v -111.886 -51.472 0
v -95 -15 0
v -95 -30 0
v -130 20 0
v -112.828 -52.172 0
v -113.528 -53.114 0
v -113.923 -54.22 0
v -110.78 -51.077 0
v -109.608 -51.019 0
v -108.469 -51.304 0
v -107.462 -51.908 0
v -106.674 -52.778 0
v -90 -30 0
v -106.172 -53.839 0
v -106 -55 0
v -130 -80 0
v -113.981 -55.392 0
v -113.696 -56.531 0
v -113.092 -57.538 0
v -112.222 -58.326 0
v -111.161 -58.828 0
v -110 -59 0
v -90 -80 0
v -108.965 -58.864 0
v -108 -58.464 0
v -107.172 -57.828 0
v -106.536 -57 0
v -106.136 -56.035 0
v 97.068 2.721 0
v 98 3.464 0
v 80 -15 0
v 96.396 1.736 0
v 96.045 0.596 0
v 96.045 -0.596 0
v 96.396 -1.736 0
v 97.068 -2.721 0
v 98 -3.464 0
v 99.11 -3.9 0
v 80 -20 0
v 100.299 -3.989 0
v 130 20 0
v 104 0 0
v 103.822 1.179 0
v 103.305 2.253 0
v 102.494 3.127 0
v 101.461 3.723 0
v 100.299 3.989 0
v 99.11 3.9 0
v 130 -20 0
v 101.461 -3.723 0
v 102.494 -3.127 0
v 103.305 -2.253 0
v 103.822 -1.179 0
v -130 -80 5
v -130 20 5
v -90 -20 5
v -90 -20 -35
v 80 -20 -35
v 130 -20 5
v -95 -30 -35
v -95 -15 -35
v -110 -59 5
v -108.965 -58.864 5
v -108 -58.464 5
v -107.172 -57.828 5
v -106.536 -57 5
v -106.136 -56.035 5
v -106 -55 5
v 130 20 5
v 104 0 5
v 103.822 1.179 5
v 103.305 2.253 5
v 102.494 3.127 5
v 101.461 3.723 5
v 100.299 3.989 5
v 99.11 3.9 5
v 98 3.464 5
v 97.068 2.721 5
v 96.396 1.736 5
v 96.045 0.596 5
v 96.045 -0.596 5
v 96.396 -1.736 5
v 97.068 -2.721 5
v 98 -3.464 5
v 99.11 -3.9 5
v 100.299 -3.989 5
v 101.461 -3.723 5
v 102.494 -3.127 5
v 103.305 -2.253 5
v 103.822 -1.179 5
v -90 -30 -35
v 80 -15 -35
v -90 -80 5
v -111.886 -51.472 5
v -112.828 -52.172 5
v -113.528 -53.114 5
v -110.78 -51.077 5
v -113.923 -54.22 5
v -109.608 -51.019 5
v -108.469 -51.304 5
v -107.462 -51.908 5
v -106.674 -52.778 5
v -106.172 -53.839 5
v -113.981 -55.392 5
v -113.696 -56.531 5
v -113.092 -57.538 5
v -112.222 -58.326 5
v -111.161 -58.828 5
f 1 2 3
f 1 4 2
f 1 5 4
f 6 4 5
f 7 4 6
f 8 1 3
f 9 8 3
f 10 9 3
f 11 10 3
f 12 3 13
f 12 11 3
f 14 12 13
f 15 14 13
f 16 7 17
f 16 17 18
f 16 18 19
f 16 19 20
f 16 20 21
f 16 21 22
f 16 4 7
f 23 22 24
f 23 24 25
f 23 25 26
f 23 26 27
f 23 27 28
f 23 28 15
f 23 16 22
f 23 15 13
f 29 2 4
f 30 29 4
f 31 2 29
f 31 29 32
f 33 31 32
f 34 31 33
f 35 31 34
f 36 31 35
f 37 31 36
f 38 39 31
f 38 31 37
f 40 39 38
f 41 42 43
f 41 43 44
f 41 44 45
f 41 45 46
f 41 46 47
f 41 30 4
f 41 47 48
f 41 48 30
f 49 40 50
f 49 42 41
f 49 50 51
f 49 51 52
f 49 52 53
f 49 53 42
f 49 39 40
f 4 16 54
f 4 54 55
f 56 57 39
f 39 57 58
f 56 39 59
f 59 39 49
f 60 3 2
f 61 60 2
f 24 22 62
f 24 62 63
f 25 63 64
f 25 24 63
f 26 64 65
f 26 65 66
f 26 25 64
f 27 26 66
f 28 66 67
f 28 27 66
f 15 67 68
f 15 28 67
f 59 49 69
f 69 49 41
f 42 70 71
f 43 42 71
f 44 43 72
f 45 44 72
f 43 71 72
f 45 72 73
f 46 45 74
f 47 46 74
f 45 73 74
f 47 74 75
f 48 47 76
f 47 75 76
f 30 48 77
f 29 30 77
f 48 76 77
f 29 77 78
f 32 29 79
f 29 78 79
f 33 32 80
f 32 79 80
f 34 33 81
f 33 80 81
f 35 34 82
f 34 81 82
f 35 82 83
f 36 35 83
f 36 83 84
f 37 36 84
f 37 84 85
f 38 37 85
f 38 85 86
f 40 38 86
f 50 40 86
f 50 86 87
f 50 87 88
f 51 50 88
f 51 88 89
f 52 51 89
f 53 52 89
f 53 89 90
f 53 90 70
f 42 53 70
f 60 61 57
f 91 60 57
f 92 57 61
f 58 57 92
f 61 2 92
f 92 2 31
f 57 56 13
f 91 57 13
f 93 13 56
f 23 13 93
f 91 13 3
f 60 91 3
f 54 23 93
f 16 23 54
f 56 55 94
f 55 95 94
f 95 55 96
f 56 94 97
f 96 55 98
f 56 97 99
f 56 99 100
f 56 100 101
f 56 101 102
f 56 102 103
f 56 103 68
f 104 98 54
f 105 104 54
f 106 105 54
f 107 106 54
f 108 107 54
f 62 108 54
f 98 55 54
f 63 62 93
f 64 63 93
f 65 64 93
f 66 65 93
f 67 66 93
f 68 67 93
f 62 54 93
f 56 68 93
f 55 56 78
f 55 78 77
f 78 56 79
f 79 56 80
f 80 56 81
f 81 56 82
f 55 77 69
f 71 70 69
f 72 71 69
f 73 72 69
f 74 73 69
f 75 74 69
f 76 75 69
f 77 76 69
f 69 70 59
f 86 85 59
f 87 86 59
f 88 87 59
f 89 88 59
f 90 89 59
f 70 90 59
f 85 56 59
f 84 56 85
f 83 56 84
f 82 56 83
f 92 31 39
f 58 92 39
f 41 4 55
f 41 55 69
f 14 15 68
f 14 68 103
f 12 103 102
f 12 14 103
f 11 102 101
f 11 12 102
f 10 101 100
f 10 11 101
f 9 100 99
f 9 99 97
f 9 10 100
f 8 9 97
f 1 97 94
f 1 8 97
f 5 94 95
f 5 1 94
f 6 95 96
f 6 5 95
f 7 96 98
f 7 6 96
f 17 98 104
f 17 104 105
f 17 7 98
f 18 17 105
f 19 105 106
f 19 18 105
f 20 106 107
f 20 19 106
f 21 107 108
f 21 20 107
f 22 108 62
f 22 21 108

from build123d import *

# Parameters (mm, degrees)
F0_W      = 260
F0_H      = 40
F1_DEPTH  = 5
F2_W      = 170
F2_H      = 5
F3_DEPTH  = 35
F5_DEPTH  = 5
F7_DEPTH  = 35
F8_R      = 4
F9_DEPTH  = 25
F10_DEPTH = 25


with BuildPart() as f1:
    # F0 (on Top) → F1 (new body)
    with BuildSketch(Plane.XY):
        Rectangle(F0_W, F0_H)
    extrude(amount=F1_DEPTH)

    # F2 (on face) → F3 (join)
    with BuildSketch(Plane(origin=(0, 0, 0), x_dir=(1, 0, 0), z_dir=(0, 0, -1))):
        with Locations((-5, 17.5)):
            Rectangle(F2_W, F2_H)
    extrude(amount=F3_DEPTH)

    # F4 (on face) → F5 (join)
    with BuildSketch(Plane(origin=(0, 0, 0), x_dir=(1, 0, 0), z_dir=(0, 0, -1))):
        with BuildLine():
            ThreePointArc((-110, 59), (-112.828427, 52.171573), (-106, 55))
            ThreePointArc((-106, 55), (-107.171573, 57.828427), (-110, 59))
        make_face()
        Polygon((-130, 80), (-130, 20), (-90, 20), (-90, 80), (-110, 80), align=None)
        with BuildLine():
            ThreePointArc((-106, 55), (-112.828427, 52.171573), (-110, 59))
            ThreePointArc((-110, 59), (-107.171573, 57.828427), (-106, 55))
        make_face(mode=Mode.SUBTRACT)
    extrude(amount=-F5_DEPTH)

    # F6 (on face) → F7 (join)
    with BuildSketch(Plane(origin=(0, 0, 0), x_dir=(1, 0, 0), z_dir=(0, 0, -1))):
        Polygon((-95, 15), (-90, 15), (-90, 20), (-90, 30), (-95, 30), align=None)
    extrude(amount=F7_DEPTH)

    # F8 (on face) → F9 (cut)
    with BuildSketch(Plane.XY.offset(5)):
        with Locations((-110, -150)):
            Circle(F8_R)
        with Locations((100, 0)):
            Circle(F8_R)
    extrude(amount=-F9_DEPTH, mode=Mode.SUBTRACT)

    # F4 (on face) → F10 (cut)
    with BuildSketch(Plane(origin=(0, 0, 0), x_dir=(1, 0, 0), z_dir=(0, 0, -1))):
        with BuildLine():
            ThreePointArc((-110, 59), (-112.828427, 52.171573), (-106, 55))
            ThreePointArc((-106, 55), (-107.171573, 57.828427), (-110, 59))
        make_face()
    extrude(amount=-F10_DEPTH, mode=Mode.SUBTRACT)


solid = f1.part
